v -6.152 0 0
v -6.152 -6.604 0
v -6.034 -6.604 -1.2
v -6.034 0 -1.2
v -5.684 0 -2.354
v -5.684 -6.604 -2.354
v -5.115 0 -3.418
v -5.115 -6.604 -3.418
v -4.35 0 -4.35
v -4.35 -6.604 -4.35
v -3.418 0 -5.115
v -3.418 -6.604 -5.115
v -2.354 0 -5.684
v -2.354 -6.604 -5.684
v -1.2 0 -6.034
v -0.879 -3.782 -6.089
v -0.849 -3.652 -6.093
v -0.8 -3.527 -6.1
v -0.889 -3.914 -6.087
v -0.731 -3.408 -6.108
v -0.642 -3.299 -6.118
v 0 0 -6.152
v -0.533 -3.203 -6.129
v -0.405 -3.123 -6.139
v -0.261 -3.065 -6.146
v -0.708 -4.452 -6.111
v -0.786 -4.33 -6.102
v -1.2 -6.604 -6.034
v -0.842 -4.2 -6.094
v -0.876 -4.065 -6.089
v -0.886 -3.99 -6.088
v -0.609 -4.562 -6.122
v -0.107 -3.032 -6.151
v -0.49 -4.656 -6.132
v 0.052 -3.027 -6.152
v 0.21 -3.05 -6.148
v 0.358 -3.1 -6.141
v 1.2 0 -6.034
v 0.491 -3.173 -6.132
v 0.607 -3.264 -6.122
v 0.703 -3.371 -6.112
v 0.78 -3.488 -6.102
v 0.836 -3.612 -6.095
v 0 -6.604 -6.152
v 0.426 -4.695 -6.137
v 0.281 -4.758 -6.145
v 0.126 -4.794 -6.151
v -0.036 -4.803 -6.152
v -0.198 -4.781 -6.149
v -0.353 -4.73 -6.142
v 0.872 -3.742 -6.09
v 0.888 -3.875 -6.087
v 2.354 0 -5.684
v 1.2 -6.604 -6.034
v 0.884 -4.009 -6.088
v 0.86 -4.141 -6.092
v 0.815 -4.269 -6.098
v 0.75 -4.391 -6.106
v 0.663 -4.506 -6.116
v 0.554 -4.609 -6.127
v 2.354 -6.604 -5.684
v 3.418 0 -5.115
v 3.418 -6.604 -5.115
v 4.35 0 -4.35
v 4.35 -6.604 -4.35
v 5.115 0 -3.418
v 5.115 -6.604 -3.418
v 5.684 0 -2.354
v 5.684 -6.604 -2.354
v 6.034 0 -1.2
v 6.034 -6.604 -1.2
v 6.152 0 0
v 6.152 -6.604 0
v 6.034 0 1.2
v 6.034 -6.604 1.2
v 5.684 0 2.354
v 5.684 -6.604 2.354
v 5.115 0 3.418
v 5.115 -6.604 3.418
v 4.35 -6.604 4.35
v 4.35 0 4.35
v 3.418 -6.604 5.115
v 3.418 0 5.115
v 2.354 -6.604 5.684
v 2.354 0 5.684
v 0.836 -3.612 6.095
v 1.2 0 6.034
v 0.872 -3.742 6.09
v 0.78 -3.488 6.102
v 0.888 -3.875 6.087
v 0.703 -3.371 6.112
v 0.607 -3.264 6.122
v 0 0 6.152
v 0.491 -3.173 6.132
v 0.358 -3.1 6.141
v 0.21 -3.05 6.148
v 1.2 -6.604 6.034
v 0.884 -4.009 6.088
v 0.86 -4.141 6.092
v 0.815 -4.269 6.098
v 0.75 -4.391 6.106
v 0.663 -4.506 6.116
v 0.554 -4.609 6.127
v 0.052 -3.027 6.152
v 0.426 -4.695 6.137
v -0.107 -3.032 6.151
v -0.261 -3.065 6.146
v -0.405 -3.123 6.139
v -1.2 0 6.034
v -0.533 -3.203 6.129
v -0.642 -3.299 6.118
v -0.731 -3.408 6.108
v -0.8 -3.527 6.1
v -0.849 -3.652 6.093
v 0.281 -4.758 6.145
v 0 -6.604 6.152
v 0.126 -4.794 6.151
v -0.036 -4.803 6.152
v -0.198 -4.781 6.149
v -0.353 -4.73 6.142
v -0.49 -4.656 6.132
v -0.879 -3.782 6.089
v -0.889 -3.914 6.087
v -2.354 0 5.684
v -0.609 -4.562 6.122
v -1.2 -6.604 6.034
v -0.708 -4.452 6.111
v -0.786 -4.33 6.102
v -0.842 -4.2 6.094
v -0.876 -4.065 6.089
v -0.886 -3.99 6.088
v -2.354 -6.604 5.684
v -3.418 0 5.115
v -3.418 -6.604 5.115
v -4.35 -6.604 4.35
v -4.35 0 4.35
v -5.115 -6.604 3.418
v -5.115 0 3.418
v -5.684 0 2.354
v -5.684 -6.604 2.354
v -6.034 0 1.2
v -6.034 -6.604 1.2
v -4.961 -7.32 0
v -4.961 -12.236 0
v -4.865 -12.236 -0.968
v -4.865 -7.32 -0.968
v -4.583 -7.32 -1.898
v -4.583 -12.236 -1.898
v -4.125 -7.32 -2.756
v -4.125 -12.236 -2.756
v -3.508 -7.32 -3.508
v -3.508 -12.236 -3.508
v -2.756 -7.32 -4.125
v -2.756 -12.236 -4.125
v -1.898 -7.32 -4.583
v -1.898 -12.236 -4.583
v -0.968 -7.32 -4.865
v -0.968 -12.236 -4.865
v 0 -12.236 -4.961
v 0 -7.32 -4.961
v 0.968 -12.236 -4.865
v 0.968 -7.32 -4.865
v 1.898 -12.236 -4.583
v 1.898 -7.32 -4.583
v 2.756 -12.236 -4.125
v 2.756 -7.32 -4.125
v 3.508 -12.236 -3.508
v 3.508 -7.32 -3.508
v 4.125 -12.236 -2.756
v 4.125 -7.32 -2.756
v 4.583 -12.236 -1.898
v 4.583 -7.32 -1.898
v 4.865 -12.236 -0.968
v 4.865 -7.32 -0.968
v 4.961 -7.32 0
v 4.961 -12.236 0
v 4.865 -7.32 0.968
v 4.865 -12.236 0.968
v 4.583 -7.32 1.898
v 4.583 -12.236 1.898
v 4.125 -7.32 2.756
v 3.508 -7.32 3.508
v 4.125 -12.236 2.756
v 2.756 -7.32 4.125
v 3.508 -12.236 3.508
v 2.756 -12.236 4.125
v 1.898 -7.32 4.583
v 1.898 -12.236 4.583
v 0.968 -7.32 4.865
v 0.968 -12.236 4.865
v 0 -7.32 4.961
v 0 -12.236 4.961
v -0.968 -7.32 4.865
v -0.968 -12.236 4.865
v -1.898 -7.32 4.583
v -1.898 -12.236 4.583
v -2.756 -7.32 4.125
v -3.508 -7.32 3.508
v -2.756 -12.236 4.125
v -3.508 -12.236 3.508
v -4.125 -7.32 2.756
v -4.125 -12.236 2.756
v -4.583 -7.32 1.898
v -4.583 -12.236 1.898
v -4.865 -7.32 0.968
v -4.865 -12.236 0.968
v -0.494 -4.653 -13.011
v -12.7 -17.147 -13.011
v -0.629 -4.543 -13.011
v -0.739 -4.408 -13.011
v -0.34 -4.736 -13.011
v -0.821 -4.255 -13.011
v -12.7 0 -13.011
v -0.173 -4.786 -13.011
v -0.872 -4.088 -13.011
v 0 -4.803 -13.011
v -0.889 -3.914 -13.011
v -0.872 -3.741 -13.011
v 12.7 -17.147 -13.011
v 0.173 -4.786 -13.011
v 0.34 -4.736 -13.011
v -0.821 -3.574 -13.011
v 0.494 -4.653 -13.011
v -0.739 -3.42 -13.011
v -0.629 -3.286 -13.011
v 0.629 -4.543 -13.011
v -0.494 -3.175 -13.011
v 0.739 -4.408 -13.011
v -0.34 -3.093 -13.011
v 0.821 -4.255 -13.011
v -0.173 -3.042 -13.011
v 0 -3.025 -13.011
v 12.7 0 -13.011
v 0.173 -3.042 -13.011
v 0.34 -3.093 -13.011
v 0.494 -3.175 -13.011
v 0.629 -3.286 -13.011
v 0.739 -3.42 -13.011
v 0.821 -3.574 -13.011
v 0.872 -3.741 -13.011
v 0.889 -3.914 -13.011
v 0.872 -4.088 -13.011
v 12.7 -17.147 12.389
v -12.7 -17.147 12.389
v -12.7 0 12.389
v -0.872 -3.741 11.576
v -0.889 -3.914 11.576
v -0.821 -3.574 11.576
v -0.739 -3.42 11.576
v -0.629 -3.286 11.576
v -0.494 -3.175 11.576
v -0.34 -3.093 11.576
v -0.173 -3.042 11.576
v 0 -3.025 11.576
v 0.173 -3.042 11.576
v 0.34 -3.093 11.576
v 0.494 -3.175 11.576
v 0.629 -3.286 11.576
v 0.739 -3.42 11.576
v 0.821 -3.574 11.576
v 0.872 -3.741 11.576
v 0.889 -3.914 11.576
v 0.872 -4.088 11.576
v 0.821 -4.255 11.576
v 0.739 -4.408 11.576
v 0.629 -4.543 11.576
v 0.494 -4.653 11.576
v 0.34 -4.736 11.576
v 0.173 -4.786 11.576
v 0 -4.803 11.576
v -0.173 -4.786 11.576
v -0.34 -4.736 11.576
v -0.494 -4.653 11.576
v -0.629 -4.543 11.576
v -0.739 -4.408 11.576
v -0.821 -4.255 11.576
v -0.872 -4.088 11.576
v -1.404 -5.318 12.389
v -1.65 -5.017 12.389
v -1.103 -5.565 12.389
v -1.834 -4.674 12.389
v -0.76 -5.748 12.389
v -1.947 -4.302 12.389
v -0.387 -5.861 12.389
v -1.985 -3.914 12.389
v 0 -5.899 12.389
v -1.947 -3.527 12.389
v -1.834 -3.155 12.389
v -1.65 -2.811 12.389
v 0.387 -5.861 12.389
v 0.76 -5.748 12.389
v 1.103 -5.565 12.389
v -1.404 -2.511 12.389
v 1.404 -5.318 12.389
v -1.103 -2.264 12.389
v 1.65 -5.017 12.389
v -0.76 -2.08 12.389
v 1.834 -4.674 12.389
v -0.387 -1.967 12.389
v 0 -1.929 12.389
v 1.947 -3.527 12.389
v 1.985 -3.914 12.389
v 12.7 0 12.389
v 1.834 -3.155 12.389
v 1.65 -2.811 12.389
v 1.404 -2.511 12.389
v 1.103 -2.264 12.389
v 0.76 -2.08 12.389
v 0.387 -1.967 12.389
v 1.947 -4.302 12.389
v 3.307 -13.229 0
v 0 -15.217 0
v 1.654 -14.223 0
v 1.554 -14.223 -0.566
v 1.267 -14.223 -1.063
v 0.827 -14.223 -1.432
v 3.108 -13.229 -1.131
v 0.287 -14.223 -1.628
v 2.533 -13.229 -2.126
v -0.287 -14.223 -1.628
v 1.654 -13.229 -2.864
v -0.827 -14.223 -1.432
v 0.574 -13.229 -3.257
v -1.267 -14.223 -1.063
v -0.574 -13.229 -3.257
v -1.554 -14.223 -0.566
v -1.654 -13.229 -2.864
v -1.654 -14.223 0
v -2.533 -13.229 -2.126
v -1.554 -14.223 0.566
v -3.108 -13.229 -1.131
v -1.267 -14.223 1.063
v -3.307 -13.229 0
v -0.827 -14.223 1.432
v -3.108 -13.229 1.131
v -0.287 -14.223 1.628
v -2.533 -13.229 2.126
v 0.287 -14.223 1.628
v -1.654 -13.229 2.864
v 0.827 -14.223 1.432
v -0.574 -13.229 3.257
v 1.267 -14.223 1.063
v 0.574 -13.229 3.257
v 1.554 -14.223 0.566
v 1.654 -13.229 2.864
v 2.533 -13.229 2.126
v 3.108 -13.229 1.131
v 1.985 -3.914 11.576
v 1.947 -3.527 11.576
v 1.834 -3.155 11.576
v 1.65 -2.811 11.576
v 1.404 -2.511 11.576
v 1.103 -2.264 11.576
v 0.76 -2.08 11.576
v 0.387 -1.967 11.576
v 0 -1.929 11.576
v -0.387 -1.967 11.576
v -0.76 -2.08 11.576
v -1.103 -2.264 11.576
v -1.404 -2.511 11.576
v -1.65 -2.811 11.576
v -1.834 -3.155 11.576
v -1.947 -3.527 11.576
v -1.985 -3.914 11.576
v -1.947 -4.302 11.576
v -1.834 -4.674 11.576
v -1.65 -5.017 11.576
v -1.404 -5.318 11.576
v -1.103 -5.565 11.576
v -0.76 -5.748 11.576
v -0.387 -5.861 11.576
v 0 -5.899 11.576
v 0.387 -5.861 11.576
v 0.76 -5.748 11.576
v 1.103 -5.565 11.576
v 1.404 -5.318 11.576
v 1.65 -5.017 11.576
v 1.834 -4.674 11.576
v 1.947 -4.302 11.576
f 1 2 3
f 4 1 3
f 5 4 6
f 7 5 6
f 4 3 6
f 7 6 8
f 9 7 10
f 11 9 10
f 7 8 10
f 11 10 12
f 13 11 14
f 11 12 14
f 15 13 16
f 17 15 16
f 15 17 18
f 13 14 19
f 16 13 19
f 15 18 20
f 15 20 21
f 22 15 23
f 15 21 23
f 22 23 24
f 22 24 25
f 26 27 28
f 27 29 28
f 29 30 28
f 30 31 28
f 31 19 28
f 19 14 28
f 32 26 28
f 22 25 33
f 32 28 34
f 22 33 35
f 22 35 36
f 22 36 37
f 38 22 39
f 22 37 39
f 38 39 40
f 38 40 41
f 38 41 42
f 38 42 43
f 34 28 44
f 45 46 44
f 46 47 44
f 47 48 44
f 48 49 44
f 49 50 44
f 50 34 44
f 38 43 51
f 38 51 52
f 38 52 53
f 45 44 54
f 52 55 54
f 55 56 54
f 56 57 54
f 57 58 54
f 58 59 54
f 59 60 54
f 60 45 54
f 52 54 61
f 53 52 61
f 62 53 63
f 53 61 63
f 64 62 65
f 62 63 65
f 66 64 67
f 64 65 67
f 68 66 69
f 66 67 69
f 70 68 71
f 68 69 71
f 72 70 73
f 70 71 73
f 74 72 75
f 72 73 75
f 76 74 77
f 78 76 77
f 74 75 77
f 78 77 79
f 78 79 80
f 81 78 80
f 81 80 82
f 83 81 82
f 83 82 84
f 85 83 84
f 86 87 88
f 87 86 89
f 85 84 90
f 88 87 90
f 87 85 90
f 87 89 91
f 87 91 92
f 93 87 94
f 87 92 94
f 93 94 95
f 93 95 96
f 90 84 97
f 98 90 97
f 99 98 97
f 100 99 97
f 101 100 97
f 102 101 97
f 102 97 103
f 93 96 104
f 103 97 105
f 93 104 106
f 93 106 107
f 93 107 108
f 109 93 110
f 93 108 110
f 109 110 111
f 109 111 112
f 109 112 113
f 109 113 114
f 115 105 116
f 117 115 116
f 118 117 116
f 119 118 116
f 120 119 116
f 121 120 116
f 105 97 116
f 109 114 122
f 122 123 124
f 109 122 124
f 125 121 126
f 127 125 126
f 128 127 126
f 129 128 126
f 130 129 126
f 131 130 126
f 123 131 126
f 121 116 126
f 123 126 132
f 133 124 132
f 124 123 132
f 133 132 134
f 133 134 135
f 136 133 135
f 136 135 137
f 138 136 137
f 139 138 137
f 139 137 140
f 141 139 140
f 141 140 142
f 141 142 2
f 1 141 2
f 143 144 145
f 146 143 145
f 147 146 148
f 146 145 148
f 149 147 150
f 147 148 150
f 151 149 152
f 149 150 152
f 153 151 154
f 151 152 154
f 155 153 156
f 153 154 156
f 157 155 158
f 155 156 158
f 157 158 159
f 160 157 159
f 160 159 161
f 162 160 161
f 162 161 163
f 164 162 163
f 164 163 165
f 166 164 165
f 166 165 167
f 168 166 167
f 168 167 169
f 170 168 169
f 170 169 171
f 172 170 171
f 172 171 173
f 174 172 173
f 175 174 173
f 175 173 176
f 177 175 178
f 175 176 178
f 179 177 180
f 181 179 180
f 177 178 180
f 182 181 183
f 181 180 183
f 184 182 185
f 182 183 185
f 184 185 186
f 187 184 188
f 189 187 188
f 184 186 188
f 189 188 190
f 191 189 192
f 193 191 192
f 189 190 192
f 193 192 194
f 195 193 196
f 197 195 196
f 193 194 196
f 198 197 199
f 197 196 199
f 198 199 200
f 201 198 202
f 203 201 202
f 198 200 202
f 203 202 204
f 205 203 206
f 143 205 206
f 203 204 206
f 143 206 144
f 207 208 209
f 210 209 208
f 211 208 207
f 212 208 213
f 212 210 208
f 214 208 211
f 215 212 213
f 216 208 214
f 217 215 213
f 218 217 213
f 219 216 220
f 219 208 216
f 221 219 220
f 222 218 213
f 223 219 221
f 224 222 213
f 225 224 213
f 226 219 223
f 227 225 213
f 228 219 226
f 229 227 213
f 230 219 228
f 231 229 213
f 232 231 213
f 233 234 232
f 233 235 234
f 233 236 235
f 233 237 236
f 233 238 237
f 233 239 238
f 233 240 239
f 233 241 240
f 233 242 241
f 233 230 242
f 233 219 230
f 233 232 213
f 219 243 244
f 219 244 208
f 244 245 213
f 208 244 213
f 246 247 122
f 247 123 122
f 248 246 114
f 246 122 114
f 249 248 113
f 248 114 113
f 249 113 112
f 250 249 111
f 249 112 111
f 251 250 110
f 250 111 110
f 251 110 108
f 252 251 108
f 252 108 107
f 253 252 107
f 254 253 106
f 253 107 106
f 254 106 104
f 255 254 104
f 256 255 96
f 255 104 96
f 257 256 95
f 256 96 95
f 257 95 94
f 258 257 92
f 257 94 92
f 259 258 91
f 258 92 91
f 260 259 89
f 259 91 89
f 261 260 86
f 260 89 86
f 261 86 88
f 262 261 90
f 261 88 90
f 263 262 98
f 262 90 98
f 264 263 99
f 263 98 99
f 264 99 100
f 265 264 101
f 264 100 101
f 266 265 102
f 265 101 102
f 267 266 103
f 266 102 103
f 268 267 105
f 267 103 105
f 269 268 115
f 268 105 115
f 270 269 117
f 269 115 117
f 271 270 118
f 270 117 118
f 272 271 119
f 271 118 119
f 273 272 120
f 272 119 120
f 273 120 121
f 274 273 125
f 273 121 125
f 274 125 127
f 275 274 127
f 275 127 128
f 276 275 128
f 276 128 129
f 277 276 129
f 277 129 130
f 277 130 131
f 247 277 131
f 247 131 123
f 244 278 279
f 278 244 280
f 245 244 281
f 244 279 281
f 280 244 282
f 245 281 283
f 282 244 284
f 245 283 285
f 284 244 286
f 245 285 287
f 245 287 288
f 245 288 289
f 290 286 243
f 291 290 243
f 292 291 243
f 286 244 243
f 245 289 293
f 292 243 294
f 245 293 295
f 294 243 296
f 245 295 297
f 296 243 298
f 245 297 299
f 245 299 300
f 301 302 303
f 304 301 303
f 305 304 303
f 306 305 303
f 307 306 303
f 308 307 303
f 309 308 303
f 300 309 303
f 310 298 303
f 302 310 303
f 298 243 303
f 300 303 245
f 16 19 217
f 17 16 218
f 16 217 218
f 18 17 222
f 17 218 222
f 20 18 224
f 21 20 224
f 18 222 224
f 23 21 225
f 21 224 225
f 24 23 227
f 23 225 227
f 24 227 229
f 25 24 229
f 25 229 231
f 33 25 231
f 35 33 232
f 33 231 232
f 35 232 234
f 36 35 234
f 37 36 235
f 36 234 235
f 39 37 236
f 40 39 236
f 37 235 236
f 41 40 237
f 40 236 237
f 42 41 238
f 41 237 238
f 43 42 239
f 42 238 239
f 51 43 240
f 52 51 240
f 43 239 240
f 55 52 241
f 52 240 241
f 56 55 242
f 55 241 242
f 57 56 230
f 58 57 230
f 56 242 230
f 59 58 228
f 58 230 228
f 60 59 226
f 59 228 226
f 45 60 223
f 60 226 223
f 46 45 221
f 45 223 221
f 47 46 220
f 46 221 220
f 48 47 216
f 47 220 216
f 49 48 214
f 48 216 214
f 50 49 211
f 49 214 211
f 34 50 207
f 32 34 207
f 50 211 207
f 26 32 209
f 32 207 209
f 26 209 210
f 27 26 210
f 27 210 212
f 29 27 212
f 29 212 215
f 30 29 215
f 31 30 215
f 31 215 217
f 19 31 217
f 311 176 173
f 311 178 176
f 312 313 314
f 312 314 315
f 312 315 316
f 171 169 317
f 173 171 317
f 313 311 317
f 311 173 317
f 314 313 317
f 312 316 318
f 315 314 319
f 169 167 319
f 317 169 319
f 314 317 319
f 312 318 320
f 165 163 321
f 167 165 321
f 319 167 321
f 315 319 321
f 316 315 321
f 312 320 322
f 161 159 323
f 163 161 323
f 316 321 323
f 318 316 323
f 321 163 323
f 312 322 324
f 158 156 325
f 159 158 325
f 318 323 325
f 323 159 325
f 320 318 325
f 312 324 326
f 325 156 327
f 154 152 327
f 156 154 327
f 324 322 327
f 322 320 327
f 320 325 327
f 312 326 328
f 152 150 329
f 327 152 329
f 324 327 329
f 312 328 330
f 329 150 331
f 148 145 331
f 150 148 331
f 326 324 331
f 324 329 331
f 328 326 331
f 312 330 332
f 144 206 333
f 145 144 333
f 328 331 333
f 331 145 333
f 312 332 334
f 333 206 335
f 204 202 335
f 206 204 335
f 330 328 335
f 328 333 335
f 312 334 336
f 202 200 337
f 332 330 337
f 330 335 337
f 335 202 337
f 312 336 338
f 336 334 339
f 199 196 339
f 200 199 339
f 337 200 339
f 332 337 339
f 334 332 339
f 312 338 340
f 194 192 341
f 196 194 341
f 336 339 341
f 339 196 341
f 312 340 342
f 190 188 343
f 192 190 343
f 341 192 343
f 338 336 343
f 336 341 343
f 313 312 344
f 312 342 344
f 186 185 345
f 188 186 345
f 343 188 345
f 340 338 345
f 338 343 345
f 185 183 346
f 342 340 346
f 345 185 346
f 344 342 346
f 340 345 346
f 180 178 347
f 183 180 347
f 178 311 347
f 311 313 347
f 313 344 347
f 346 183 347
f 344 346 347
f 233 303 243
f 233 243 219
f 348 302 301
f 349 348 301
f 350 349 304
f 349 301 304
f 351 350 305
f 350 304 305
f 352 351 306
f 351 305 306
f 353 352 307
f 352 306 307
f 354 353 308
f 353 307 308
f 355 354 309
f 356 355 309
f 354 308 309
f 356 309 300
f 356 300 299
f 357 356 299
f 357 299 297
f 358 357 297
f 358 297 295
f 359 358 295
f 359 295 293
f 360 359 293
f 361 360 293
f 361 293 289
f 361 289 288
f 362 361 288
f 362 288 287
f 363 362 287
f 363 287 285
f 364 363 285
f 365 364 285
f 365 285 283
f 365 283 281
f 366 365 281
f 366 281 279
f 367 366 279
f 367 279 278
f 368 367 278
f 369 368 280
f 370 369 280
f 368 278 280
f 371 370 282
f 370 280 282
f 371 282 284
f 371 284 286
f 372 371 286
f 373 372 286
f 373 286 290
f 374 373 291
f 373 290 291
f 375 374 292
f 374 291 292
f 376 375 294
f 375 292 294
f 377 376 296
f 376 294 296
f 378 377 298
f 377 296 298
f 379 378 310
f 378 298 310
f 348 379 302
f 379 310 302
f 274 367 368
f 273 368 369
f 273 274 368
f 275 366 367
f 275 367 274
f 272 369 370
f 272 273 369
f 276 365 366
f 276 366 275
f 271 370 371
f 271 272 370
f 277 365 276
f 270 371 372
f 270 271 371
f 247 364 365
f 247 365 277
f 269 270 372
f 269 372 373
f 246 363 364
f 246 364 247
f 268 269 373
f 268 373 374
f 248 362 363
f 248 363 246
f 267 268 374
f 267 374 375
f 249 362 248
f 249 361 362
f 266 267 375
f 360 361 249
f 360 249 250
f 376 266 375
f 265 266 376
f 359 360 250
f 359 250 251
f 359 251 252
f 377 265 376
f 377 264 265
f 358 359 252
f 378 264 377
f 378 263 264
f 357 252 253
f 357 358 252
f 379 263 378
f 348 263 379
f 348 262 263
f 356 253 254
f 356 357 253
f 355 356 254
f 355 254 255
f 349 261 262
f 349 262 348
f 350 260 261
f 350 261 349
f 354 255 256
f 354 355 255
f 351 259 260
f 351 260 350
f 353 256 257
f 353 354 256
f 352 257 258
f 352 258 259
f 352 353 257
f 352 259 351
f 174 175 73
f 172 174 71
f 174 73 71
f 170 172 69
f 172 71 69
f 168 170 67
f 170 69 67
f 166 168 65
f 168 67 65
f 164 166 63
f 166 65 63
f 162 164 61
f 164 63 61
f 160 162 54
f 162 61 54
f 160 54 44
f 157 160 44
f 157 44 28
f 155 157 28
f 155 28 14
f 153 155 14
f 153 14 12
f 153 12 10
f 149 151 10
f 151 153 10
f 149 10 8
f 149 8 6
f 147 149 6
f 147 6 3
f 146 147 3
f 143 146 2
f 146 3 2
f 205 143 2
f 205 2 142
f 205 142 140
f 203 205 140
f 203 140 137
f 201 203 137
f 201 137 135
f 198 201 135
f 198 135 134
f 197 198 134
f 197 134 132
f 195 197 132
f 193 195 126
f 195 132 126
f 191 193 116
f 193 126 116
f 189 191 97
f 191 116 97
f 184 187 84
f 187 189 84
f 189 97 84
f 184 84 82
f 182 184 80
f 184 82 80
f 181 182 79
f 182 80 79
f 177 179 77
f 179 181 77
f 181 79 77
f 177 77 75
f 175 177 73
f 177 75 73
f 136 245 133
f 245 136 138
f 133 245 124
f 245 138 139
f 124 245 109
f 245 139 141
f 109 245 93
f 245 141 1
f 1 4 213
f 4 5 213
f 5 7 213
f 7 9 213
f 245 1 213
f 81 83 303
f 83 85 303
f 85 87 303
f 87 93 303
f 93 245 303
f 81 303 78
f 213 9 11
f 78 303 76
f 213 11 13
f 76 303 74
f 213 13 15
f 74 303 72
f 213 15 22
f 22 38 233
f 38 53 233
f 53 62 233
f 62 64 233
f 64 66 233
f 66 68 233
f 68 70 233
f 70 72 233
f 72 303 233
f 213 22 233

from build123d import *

# Parameters (mm, degrees)
SKETCH2_W                                           = 25.4
SKETCH2_H                                           = 17.146948585
BOSS_EXTRUDE1_DEPTH                                 = 12.7
F_7_16_20_TAPPED_HOLE1_D                            = 9.92124
F_7_16_20_TAPPED_HOLE1_DEPTH                        = 12.235907381
F_7_16_20_TAPPED_HOLE1_TIP                          = 2.980641204
F_7_16_CLEARANCE_HOLE3_D                            = 12.30376
F_7_16_CLEARANCE_HOLE3_DEPTH                        = 6.604
F_7_16_CLEARANCE_HOLE3_TIP                          = 3.696422425
CBORE_FOR_0_BINDING_HEAD_MACHINE_SCREW1_D           = 1.778
CBORE_FOR_0_BINDING_HEAD_MACHINE_SCREW1_CBORE_D     = 3.97002
CBORE_FOR_0_BINDING_HEAD_MACHINE_SCREW1_CBORE_DEPTH = 0.8128


with BuildPart() as part:
    # Sketch2 → Boss-Extrude1 (new, symmetric)
    with BuildSketch(Plane(origin=(0, 0, 0), x_dir=(0, 0, -1), z_dir=(1, 0, 0))):
        with Locations((0.311038218, -8.573474293)):
            Rectangle(SKETCH2_W, SKETCH2_H)
    extrude(amount=BOSS_EXTRUDE1_DEPTH, both=True)

    # 7/16-20 Tapped Hole1
    with Locations(Plane(origin=(0, 0, 0), x_dir=(1, 0, 0), z_dir=(0, 1, 0))):
        with Locations((0, 0)):
            Hole(F_7_16_20_TAPPED_HOLE1_D / 2, depth=F_7_16_20_TAPPED_HOLE1_DEPTH)
            with Locations((0, 0, -(F_7_16_20_TAPPED_HOLE1_DEPTH + F_7_16_20_TAPPED_HOLE1_TIP / 2))):  # 118° drill point
                Cone(0, F_7_16_20_TAPPED_HOLE1_D / 2, F_7_16_20_TAPPED_HOLE1_TIP, mode=Mode.SUBTRACT)

    # 7/16 Clearance Hole3
    with Locations(Plane(origin=(0, 0, 0), x_dir=(1, 0, 0), z_dir=(0, 1, 0))):
        with Locations((0, 0)):
            Hole(F_7_16_CLEARANCE_HOLE3_D / 2, depth=F_7_16_CLEARANCE_HOLE3_DEPTH)
            with Locations((0, 0, -(F_7_16_CLEARANCE_HOLE3_DEPTH + F_7_16_CLEARANCE_HOLE3_TIP / 2))):  # 118° drill point
                Cone(0, F_7_16_CLEARANCE_HOLE3_D / 2, F_7_16_CLEARANCE_HOLE3_TIP, mode=Mode.SUBTRACT)

    # CBORE for #0 Binding Head Machine Screw1 (through all)
    with Locations(Plane(origin=(0, -3.914304801, 12.388961782), x_dir=(1, 0, 0), z_dir=(0, 0, 1))):
        with Locations((0, 0)):
            CounterBoreHole(CBORE_FOR_0_BINDING_HEAD_MACHINE_SCREW1_D / 2, CBORE_FOR_0_BINDING_HEAD_MACHINE_SCREW1_CBORE_D / 2, CBORE_FOR_0_BINDING_HEAD_MACHINE_SCREW1_CBORE_DEPTH)


solid = part.part
